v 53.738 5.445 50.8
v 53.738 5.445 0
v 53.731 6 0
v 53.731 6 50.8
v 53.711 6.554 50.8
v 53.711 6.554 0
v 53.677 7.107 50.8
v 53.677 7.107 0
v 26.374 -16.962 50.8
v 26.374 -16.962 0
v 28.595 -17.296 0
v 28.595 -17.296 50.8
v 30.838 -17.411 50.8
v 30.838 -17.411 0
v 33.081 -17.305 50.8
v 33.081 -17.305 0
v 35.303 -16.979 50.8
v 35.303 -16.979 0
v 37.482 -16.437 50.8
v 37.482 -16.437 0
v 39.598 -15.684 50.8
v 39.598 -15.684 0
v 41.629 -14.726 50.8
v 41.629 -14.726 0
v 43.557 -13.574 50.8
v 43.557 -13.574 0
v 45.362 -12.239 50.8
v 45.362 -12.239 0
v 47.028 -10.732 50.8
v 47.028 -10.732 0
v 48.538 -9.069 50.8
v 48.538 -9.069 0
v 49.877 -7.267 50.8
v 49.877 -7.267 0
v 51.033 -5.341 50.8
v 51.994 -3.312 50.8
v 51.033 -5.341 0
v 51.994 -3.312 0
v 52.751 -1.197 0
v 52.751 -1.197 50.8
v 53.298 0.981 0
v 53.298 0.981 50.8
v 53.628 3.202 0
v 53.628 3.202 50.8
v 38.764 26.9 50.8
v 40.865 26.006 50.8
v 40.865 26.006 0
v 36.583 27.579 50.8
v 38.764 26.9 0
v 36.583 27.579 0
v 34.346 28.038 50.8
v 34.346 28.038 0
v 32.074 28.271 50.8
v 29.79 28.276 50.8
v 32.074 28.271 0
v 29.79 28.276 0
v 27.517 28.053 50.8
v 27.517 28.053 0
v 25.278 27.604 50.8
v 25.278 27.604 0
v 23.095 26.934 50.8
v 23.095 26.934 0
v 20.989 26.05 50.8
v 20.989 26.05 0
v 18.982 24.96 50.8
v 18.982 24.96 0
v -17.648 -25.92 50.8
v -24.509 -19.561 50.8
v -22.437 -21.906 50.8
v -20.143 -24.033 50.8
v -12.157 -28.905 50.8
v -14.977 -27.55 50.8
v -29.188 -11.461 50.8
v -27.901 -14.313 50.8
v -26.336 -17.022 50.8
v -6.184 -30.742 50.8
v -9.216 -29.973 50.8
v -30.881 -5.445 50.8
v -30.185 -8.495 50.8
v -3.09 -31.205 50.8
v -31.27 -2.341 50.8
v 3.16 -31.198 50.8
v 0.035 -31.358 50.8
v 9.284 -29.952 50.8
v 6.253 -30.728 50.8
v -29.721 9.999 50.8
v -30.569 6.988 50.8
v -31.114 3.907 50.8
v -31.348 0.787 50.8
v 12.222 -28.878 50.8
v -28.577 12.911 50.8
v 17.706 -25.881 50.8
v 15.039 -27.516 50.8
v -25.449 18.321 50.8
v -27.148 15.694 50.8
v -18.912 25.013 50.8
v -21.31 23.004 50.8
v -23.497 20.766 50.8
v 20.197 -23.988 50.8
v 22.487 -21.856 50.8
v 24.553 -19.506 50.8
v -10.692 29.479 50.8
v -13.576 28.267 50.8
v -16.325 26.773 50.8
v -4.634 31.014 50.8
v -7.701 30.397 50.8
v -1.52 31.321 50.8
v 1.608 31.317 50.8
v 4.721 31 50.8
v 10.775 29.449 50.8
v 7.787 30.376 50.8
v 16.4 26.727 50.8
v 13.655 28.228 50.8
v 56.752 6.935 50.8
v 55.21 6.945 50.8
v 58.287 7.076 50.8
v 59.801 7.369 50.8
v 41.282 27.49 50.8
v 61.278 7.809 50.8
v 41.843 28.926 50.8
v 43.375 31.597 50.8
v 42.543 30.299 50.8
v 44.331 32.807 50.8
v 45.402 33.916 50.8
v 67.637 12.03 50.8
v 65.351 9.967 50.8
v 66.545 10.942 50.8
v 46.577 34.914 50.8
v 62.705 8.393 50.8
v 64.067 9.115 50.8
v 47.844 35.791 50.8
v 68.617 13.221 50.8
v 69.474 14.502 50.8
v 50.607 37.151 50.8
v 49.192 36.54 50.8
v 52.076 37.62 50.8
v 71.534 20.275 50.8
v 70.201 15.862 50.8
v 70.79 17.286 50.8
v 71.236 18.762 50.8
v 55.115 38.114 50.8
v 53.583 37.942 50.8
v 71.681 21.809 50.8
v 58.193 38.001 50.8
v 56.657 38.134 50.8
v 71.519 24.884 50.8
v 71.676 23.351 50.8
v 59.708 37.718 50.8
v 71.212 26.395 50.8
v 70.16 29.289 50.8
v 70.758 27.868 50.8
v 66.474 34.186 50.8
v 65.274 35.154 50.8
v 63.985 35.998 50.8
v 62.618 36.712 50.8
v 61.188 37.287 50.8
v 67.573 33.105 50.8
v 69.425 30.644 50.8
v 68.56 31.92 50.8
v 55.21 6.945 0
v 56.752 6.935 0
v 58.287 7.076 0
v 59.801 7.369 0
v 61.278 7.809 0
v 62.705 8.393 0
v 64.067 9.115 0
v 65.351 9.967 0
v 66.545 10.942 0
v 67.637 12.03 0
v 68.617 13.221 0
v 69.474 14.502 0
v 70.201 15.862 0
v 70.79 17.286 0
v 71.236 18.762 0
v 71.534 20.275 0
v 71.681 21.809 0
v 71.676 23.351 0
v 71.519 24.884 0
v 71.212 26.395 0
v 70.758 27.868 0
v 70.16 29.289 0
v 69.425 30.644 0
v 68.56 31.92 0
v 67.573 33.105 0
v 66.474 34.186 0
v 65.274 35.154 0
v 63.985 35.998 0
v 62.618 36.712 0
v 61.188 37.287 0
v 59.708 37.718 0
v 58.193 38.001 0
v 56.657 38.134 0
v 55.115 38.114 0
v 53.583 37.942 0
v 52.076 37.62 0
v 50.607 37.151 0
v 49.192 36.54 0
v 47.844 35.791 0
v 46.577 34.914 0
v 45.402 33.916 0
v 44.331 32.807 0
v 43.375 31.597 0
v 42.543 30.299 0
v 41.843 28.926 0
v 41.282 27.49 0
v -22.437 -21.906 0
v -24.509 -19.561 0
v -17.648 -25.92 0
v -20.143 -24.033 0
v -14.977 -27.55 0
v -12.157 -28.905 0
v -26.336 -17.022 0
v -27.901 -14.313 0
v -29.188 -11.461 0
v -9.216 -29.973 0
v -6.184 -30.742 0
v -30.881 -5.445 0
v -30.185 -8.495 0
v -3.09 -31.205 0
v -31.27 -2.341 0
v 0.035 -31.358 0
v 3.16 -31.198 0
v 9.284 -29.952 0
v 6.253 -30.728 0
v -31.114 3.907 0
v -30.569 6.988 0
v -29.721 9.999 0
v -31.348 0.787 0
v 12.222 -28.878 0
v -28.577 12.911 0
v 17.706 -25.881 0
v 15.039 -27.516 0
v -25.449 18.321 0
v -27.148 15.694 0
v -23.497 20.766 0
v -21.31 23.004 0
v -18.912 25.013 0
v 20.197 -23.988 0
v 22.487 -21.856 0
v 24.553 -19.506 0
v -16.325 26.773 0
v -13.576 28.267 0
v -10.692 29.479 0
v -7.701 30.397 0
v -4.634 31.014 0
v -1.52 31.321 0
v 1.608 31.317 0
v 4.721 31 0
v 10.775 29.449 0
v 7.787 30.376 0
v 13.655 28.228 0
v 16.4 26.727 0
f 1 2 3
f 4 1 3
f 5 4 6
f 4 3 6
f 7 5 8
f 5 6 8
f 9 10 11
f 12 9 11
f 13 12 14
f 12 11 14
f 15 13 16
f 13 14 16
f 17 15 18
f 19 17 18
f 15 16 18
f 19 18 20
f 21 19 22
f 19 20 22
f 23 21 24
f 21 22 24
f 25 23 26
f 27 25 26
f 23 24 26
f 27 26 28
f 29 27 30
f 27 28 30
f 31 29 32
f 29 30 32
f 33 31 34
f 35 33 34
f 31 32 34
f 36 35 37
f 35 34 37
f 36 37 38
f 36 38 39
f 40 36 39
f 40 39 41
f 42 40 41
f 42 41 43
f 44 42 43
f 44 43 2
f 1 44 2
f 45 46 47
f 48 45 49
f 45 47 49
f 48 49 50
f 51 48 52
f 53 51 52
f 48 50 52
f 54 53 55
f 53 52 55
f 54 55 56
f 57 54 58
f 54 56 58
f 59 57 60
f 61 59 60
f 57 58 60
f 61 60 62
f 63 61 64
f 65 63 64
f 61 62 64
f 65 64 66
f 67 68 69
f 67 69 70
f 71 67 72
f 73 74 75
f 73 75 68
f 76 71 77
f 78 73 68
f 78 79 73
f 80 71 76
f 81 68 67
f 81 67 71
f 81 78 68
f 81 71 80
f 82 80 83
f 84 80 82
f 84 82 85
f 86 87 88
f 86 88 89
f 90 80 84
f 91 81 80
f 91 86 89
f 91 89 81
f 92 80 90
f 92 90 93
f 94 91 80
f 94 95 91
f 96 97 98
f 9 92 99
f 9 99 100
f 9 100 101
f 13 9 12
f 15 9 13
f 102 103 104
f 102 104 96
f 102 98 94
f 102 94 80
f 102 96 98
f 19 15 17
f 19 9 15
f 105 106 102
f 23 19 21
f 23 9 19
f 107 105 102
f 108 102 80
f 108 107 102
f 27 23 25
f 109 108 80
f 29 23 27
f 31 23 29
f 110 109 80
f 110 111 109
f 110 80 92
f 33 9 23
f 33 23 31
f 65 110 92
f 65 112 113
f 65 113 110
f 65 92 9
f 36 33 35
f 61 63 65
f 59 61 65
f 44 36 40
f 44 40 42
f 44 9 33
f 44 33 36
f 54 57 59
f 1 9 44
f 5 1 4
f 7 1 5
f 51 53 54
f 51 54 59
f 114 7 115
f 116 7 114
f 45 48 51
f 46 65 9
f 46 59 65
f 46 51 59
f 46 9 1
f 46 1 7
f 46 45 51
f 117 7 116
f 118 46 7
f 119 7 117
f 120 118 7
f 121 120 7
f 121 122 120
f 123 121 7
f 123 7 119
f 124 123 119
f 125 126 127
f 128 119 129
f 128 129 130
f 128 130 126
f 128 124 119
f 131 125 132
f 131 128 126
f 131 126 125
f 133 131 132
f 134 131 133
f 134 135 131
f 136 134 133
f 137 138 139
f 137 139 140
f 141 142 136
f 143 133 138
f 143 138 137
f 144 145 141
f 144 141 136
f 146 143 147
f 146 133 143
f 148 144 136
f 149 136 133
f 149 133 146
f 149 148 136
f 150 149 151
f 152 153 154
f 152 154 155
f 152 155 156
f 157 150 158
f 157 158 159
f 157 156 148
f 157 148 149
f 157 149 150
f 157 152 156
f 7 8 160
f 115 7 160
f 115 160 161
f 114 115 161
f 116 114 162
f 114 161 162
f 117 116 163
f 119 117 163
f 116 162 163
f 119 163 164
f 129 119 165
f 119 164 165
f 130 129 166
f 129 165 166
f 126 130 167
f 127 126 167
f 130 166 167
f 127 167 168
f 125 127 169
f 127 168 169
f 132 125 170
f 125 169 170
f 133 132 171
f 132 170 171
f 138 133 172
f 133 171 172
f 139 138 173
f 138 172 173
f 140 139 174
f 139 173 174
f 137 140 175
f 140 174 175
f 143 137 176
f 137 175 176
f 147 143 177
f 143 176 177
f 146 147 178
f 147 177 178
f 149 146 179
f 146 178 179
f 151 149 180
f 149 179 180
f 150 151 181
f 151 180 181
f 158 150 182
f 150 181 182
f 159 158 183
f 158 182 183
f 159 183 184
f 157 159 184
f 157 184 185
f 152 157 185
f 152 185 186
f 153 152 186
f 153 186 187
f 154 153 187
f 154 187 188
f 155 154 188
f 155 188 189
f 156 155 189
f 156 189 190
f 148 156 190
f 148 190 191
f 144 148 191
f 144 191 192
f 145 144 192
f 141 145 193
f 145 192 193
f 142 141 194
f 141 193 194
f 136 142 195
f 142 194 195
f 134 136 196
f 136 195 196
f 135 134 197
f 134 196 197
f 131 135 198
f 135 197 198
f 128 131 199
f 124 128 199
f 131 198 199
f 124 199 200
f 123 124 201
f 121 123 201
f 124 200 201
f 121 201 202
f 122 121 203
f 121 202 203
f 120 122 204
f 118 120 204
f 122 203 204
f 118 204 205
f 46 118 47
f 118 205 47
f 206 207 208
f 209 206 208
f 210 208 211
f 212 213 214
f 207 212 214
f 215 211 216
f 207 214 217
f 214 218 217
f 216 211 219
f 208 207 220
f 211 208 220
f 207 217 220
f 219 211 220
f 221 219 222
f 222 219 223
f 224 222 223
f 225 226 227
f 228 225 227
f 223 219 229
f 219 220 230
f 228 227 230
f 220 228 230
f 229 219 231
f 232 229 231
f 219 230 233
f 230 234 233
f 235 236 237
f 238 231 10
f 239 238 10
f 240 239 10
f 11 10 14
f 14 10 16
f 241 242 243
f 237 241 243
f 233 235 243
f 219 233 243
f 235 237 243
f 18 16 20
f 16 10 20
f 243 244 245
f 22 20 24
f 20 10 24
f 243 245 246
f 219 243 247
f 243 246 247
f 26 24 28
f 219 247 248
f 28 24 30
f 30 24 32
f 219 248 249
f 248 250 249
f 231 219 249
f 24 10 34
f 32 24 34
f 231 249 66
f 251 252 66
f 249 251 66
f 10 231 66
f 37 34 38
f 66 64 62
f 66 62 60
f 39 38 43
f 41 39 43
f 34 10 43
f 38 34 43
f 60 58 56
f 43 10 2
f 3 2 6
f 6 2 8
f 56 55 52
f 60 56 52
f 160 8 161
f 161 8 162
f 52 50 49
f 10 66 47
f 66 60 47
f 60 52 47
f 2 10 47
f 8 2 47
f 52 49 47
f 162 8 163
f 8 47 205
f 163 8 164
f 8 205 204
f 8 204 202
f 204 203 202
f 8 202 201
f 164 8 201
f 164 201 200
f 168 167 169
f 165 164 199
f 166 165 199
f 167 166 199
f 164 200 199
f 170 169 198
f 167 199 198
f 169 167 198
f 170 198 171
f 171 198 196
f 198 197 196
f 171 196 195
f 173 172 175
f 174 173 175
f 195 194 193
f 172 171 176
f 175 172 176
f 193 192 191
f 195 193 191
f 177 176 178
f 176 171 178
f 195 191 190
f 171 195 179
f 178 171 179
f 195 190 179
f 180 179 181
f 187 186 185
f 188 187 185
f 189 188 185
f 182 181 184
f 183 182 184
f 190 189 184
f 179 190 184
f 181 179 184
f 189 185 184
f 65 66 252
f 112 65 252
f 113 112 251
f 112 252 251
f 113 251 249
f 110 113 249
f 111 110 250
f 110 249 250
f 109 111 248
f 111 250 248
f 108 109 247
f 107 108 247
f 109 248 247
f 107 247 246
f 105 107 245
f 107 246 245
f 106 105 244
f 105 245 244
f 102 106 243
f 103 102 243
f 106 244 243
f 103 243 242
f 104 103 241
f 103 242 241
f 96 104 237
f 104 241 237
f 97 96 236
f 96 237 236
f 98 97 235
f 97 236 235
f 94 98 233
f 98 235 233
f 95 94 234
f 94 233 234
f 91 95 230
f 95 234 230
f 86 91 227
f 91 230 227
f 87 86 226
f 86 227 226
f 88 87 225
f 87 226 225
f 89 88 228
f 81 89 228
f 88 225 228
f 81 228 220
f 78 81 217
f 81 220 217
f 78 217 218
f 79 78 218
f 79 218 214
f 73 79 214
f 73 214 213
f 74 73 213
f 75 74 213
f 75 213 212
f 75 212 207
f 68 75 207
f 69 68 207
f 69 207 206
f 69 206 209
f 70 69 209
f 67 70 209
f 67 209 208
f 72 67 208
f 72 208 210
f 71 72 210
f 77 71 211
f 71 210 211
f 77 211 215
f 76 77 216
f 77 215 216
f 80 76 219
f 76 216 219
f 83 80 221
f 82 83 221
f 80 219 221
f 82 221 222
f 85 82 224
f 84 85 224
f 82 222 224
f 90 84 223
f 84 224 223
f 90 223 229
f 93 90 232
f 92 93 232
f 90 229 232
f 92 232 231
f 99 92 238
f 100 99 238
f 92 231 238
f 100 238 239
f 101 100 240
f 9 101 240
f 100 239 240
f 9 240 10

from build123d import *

# Parameters (mm, degrees)
F1_DEPTH = 50.8


# Not quite as in the source:
# - the program builds the solid bodies; features that only make, move or delete a surface that nothing else refers to are left out


with BuildPart() as f1:
    # F0 (on Top) → F1 (new body)
    with BuildSketch(Plane.XY):
        with BuildLine():
            ThreePointArc((71.697641485, 22.5322768092), (57.8335915966, 38.0459789198), (40.8652917128, 26.0058945539))
            ThreePointArc((40.8652917128, 26.0058945539), (49.8001603414, 18.2709960085), (53.6773841191, 7.1073197012))
            ThreePointArc((53.6773841191, 7.1073197012), (66.2378886043, 10.6720599339), (71.697641485, 22.5322768092))
        make_face()
        with BuildLine():
            ThreePointArc((40.8652917128, 26.0058945539), (29.7902072309, 28.2756215729), (18.9821024809, 24.9598971069))
            ThreePointArc((18.9821024809, 24.9598971069), (28.094084627, 13.9297913535), (31.3578806392, 0))
            ThreePointArc((31.3578806392, 0), (30.0861647392, -8.8396475875), (26.3741656765, -16.9623130219))
            ThreePointArc((26.3741656765, -16.9623130219), (45.3624091415, -12.2385728556), (53.7378936923, 5.4452720199))
            ThreePointArc((53.7378936923, 5.4452720199), (53.7227612897, 6.2768464158), (53.6773841191, 7.1073197012))
            ThreePointArc((53.6773841191, 7.1073197012), (43.1635782705, 13.7717941683), (40.8652917128, 26.0058945539))
        make_face()
        with BuildLine():
            ThreePointArc((53.6773841191, 7.1073197012), (49.8001603414, 18.2709960085), (40.8652917128, 26.0058945539))
            ThreePointArc((40.8652917128, 26.0058945539), (43.1635782705, 13.7717941683), (53.6773841191, 7.1073197012))
        make_face()
        with BuildLine():
            ThreePointArc((25.2208191949, -16.6990878355), (28.9640451764, -8.7197099962), (30.2481281305, 0))
            ThreePointArc((30.2481281305, 0), (27.0098398624, 13.6168207012), (17.9883409986, 24.3180764765))
            ThreePointArc((17.9883409986, 24.3180764765), (8.3723071222, 1.4762729148), (25.2208191949, -16.6990878355))
        make_face()
        with BuildLine():
            ThreePointArc((17.9883409986, 24.3180764765), (27.0098398624, 13.6168207012), (30.2481281305, 0))
            ThreePointArc((30.2481281305, 0), (28.9640451764, -8.7197099962), (25.2208191949, -16.6990878355))
            ThreePointArc((25.2208191949, -16.6990878355), (25.7957891487, -16.8381635446), (26.3741656765, -16.9623130219))
            ThreePointArc((26.3741656765, -16.9623130219), (30.0861647392, -8.8396475875), (31.3578806392, 0))
            ThreePointArc((31.3578806392, 0), (28.094084627, 13.9297913535), (18.9821024809, 24.9598971069))
            ThreePointArc((18.9821024809, 24.9598971069), (18.4810686237, 24.6454172593), (17.9883409986, 24.3180764765))
        make_face()
        with BuildLine():
            ThreePointArc((25.2208191949, -16.6990878355), (-29.7885854516, -5.2525643445), (17.9883409986, 24.3180764765))
            ThreePointArc((17.9883409986, 24.3180764765), (18.4810686237, 24.6454172593), (18.9821024809, 24.9598971069))
            ThreePointArc((18.9821024809, 24.9598971069), (-30.881478119, -5.4452720199), (26.3741656765, -16.9623130219))
            ThreePointArc((26.3741656765, -16.9623130219), (25.7957891487, -16.8381635446), (25.2208191949, -16.6990878355))
        make_face()
        with BuildLine():
            ThreePointArc((25.2208191949, -16.6990878355), (8.3723071222, 1.4762729148), (17.9883409986, 24.3180764765))
            ThreePointArc((17.9883409986, 24.3180764765), (-29.7885854516, -5.2525643445), (25.2208191949, -16.6990878355))
        make_face()
    extrude(amount=F1_DEPTH)


solid = f1.part
